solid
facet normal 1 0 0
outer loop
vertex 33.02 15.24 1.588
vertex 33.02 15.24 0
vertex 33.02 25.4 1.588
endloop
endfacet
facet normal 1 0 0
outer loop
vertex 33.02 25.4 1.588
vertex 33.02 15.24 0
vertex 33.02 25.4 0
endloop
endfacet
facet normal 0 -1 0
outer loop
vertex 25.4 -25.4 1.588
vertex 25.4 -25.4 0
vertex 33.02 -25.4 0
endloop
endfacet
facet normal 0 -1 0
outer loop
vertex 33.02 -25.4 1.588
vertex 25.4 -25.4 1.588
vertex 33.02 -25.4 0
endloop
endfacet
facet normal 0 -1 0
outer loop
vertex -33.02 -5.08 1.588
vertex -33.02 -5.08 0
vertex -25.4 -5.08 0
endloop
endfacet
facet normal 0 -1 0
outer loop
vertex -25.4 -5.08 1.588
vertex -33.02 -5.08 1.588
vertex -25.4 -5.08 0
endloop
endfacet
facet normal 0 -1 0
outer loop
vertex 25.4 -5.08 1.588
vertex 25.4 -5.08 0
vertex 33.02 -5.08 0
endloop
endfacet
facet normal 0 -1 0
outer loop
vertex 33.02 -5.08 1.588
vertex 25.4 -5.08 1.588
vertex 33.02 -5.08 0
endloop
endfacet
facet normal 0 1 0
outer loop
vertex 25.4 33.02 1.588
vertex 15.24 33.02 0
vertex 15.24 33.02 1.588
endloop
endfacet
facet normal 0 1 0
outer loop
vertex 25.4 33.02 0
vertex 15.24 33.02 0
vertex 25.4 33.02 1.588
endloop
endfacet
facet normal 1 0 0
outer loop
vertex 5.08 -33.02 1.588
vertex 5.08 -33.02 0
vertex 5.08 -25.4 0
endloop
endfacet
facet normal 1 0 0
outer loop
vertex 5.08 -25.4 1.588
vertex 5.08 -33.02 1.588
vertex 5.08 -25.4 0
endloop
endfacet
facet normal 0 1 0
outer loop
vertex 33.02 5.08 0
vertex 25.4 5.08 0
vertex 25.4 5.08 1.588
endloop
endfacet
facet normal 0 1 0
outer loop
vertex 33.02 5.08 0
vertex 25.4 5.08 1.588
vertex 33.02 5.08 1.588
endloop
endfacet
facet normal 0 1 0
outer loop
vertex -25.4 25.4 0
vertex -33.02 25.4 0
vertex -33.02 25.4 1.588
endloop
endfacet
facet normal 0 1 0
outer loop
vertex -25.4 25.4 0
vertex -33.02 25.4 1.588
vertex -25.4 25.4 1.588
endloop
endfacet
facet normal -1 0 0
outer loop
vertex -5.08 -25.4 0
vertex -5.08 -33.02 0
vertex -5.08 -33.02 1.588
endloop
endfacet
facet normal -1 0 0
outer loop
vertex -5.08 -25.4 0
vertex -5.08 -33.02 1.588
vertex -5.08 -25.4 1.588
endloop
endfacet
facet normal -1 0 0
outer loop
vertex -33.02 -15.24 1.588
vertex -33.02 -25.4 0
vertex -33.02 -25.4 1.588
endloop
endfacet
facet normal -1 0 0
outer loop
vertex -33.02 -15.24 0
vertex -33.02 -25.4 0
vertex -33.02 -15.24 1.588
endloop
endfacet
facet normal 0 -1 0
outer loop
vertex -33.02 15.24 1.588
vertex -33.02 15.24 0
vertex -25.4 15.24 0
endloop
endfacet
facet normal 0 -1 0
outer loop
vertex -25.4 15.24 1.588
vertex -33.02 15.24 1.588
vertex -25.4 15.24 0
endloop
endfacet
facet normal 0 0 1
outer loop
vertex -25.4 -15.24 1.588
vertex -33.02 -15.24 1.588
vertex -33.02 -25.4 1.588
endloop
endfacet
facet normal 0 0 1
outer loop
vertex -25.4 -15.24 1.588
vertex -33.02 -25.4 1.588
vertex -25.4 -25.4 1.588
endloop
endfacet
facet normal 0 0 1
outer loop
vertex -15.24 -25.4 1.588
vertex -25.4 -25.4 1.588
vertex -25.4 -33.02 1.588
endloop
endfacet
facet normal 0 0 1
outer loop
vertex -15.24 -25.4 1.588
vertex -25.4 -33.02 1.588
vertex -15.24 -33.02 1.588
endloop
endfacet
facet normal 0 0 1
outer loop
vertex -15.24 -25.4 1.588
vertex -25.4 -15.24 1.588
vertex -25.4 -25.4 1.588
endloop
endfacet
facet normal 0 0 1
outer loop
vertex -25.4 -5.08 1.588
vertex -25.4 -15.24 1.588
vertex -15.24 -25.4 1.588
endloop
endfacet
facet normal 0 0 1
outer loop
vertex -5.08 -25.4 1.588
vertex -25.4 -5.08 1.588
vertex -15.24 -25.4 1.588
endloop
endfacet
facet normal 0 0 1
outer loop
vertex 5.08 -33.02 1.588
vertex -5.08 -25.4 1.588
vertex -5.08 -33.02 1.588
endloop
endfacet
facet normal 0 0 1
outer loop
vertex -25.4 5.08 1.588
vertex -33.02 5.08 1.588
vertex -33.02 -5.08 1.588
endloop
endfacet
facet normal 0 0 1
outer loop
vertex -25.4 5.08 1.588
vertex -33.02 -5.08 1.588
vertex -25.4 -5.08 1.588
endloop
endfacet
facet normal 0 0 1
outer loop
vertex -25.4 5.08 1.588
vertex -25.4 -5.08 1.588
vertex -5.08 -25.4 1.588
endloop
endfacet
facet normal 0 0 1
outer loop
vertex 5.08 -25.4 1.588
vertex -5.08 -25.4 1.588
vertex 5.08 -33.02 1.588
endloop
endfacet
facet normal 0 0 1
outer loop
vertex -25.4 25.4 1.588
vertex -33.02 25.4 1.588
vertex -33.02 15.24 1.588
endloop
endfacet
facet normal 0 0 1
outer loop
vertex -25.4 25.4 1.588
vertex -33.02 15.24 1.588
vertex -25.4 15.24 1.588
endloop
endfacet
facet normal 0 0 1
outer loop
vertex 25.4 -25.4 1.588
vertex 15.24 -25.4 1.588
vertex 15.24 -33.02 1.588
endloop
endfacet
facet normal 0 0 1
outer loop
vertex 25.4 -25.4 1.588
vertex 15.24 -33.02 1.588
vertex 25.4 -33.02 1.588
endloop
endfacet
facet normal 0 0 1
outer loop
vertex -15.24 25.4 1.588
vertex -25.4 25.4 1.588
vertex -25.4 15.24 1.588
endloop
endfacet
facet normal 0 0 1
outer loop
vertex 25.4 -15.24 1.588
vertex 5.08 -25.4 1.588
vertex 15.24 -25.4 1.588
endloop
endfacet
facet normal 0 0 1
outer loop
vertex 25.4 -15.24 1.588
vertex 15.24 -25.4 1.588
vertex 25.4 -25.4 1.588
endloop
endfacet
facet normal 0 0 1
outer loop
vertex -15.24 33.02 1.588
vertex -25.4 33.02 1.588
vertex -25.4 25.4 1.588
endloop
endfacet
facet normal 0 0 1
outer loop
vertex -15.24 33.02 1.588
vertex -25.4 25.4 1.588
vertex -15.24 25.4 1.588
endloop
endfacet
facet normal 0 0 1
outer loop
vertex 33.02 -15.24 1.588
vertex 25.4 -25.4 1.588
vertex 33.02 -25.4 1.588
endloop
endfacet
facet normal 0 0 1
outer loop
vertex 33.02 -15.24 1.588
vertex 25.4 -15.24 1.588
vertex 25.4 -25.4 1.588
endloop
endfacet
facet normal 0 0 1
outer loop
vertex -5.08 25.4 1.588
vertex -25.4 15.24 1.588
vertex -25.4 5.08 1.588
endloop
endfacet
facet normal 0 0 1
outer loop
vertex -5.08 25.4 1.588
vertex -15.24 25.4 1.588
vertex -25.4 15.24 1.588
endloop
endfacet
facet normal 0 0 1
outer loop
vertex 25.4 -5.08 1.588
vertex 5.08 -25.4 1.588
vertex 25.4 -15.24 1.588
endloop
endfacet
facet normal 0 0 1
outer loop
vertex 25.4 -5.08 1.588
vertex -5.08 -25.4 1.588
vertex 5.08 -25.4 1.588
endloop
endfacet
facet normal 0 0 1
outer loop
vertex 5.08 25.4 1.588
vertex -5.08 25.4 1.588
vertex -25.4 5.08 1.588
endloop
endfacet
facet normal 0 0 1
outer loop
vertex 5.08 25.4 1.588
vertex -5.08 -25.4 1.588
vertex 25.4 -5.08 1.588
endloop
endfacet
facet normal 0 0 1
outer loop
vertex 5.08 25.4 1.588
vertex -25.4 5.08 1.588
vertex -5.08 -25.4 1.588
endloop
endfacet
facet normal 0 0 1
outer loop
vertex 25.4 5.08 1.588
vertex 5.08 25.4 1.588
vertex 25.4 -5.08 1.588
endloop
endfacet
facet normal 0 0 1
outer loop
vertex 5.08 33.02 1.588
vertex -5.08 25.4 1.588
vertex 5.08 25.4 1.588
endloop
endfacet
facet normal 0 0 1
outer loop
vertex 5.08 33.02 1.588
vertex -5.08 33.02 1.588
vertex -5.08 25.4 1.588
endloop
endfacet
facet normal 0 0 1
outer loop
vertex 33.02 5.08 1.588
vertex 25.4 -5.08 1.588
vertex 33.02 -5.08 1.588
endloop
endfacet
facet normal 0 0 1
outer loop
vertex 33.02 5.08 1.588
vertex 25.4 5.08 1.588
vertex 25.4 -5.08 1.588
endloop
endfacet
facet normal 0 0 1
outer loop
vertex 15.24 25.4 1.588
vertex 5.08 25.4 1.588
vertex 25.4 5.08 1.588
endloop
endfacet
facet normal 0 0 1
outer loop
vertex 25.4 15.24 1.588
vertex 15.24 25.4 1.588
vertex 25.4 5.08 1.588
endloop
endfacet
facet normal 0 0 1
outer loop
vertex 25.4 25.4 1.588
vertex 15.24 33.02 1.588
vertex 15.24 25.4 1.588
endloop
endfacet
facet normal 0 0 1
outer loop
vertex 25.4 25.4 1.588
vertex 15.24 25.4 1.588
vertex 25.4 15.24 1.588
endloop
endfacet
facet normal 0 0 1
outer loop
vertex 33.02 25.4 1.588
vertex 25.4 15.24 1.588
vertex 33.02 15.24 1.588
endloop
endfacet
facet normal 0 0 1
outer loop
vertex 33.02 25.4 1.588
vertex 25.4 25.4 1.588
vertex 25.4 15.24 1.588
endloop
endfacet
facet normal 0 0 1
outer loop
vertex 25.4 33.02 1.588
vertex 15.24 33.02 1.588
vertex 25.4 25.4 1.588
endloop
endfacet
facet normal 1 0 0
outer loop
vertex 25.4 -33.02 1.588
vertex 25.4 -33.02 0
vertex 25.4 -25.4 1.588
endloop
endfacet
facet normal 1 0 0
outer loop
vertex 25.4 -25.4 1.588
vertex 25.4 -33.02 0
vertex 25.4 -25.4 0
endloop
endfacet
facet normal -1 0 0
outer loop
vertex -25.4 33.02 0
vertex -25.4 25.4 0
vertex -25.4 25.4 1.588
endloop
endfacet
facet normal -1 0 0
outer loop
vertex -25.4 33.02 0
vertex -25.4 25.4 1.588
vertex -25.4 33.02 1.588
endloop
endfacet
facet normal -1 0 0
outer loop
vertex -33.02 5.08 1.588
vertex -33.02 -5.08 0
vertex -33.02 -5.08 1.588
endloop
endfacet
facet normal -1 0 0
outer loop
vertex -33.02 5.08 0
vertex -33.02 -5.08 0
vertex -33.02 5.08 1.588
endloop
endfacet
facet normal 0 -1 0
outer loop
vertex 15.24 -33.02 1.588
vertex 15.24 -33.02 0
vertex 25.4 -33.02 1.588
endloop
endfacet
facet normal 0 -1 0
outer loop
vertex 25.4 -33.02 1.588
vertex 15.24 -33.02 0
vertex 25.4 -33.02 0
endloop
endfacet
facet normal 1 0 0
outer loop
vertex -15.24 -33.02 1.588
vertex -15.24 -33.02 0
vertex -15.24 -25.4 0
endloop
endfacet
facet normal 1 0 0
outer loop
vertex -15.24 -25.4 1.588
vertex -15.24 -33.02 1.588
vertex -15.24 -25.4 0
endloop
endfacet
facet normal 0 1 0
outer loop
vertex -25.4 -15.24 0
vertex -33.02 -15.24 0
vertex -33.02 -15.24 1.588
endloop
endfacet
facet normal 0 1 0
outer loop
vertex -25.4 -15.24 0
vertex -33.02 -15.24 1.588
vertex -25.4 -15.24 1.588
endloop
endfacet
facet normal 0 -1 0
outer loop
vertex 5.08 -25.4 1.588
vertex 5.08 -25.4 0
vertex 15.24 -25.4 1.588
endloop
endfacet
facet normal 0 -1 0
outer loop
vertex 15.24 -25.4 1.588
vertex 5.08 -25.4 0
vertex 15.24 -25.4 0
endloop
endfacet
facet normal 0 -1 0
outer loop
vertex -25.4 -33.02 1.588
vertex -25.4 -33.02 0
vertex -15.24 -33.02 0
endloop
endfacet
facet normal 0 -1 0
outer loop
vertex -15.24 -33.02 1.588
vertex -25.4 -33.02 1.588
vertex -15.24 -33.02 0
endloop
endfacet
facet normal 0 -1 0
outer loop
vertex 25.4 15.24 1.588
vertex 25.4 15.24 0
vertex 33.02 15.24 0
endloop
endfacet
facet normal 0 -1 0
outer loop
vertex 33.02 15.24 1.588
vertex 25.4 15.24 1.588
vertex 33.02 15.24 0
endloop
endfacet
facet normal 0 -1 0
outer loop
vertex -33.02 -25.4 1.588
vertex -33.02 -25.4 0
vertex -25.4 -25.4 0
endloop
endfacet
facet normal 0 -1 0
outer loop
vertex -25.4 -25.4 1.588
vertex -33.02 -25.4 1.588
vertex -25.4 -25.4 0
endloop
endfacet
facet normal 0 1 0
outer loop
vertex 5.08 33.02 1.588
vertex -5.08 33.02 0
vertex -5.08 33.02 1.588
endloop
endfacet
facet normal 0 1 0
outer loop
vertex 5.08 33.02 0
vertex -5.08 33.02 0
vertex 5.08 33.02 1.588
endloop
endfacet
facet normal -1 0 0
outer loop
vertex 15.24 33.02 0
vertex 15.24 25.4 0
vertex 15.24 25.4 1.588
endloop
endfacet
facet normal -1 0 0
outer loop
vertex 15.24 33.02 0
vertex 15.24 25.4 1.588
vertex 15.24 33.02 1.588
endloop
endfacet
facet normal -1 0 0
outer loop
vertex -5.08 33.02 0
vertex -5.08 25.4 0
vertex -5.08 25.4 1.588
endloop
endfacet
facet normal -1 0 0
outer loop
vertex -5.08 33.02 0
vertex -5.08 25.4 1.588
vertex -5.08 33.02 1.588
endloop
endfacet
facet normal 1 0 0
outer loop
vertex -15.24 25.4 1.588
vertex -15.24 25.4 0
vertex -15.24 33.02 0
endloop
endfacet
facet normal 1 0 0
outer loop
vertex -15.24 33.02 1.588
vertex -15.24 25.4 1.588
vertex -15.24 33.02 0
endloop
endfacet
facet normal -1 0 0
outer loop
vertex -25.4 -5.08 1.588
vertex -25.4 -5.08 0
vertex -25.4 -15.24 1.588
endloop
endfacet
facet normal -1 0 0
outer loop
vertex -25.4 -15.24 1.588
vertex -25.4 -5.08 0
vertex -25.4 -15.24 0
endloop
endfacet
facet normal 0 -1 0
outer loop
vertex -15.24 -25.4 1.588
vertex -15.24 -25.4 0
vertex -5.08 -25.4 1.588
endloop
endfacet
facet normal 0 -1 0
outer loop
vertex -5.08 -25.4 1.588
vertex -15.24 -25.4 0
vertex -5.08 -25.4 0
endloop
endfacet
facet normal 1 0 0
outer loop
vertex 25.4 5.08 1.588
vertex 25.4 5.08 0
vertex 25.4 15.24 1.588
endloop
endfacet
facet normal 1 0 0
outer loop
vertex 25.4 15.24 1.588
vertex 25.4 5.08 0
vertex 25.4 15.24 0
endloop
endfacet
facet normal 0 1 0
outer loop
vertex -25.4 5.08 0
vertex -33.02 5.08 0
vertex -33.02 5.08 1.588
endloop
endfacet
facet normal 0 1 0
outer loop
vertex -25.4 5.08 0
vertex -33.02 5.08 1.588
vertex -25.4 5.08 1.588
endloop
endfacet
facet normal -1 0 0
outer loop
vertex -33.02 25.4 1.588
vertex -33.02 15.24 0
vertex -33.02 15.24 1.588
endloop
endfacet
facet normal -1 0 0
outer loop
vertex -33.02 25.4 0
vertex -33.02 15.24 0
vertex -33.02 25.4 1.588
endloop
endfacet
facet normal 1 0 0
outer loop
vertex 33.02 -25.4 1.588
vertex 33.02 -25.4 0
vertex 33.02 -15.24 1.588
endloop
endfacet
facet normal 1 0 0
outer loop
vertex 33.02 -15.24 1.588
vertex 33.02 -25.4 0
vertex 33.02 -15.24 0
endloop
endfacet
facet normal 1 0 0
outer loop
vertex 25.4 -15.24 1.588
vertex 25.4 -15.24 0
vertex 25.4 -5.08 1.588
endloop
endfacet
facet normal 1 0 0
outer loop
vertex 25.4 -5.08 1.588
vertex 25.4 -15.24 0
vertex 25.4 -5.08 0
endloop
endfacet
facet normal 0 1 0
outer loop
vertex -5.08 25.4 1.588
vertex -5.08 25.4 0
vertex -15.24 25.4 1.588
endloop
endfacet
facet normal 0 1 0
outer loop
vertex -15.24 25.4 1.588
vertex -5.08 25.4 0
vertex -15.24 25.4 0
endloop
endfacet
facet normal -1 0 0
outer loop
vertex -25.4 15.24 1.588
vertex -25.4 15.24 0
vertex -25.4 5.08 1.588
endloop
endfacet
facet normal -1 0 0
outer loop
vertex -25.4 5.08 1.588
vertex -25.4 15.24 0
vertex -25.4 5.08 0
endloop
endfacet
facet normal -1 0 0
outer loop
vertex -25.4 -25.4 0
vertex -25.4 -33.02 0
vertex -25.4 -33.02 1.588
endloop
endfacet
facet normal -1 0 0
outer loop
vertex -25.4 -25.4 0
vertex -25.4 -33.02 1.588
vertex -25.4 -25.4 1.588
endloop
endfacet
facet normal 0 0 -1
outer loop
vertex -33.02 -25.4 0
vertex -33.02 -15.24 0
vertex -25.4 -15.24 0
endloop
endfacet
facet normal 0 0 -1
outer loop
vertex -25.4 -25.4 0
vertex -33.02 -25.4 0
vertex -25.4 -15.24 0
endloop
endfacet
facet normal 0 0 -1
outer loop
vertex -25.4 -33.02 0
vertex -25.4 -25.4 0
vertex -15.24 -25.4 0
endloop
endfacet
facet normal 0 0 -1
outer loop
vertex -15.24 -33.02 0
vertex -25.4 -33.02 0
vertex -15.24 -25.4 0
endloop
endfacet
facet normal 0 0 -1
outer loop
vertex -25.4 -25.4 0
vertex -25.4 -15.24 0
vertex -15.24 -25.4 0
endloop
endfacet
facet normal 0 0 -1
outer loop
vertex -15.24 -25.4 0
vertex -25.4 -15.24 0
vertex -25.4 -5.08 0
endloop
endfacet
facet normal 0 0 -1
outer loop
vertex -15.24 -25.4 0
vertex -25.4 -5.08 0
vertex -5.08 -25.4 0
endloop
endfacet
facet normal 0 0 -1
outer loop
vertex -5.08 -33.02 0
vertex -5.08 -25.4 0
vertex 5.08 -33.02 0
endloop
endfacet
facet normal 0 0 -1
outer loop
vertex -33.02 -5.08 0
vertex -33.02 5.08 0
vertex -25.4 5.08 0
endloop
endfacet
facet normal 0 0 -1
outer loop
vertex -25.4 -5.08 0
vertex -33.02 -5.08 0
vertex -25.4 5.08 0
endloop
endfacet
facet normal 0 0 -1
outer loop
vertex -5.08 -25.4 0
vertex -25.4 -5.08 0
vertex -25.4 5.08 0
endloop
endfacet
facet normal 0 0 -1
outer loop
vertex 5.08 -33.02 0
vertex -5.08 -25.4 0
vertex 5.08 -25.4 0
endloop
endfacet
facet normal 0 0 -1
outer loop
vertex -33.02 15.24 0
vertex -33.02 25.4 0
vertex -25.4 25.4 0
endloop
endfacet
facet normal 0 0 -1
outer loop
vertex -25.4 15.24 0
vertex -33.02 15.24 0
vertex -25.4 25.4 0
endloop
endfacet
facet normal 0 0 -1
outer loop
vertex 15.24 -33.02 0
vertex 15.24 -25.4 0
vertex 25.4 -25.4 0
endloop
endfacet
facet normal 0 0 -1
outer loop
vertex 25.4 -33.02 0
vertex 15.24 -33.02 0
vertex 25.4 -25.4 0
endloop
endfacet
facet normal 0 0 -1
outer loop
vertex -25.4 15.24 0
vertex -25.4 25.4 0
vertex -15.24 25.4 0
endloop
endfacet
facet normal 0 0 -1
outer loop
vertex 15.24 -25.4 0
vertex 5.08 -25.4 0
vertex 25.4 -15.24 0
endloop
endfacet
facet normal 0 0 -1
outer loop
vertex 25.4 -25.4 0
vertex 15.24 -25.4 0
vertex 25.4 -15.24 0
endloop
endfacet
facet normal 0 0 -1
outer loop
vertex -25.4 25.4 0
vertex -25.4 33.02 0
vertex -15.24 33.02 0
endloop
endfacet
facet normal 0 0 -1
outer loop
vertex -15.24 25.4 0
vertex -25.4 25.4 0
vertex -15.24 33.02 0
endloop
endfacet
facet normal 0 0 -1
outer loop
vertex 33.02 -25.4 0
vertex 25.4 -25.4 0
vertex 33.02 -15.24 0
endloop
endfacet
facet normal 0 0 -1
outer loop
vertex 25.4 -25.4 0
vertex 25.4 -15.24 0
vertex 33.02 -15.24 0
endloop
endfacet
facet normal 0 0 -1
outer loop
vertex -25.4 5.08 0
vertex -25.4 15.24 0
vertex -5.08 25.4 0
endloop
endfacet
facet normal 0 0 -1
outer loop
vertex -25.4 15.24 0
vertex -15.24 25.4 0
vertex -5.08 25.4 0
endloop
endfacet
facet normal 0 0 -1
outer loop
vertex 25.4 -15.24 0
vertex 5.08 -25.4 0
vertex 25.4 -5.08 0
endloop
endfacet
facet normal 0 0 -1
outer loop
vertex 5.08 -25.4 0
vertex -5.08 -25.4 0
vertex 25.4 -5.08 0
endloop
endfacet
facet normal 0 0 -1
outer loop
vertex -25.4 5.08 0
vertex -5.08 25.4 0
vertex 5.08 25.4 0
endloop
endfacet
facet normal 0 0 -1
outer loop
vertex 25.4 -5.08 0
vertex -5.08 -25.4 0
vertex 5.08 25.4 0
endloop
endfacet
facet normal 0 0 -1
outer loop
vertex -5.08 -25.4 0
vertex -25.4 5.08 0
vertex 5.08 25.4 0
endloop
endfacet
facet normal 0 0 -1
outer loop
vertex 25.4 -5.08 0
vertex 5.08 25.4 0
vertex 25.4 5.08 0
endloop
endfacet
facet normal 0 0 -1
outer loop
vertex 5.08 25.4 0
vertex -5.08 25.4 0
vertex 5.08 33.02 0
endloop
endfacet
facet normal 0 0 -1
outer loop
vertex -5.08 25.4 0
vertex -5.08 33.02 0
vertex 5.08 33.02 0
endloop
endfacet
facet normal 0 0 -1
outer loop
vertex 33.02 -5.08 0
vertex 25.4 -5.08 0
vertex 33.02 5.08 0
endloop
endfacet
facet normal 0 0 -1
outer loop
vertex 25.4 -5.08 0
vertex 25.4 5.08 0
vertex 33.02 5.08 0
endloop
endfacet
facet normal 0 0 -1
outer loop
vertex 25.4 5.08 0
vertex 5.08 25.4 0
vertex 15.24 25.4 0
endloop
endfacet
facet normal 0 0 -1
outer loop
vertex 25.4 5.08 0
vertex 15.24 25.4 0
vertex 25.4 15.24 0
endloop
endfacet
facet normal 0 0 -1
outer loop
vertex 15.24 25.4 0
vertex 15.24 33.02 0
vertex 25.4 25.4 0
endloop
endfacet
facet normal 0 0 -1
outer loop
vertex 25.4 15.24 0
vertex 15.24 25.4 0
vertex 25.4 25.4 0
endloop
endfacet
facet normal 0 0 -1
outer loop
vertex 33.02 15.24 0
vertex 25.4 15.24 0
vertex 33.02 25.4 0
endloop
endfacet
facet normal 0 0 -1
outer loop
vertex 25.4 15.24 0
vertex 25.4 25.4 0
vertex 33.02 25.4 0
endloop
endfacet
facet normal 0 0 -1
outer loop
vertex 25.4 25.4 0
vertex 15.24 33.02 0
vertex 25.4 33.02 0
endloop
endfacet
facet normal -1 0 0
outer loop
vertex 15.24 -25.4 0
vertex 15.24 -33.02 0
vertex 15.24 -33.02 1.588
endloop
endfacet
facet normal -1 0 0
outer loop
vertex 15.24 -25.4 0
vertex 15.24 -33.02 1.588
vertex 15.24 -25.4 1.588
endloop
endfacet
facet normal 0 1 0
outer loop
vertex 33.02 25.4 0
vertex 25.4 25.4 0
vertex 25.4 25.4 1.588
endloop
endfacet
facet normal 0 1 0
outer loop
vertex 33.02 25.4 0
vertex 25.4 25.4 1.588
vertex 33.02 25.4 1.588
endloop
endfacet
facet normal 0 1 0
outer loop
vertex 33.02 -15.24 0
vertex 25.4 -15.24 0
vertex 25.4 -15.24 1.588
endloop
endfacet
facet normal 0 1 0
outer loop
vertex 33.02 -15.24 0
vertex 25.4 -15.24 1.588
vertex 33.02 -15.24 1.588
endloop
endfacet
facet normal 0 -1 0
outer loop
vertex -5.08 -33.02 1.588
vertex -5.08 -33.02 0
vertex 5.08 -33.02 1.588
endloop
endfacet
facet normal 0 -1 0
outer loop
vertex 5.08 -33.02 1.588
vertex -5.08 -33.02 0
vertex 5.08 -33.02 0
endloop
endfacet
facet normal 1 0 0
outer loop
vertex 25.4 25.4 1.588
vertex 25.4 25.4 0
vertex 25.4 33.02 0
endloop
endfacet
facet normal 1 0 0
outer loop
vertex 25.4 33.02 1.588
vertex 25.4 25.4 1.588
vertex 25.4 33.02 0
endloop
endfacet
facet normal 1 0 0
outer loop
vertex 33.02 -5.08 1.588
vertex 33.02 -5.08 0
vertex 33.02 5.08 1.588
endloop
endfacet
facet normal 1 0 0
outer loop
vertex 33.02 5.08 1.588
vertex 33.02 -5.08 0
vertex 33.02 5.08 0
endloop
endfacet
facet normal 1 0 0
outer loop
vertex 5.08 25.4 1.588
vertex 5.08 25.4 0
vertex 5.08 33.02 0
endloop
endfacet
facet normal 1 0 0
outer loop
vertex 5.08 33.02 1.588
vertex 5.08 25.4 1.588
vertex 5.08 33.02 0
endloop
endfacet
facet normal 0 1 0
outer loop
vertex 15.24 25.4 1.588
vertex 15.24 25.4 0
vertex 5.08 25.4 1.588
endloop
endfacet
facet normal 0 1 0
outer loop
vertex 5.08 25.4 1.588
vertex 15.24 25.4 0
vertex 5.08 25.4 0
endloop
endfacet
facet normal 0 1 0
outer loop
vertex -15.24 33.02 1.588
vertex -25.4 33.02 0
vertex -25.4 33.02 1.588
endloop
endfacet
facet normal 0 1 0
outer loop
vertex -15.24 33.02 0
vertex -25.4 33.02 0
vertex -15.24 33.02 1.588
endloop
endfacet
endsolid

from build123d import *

# Parameters (mm, degrees)
F0_W     = 7.62
F0_H     = 10.16
F0_W_2   = 10.16
F0_H_2   = 7.62
F0_W_3   = 10.160000307
F0_W_4   = 7.619999693
F1_DEPTH = 1.5875


# Not quite as in the source:
# - ends of sketch curves that miss each other by under 0.0002 mm in the source are joined


with BuildPart() as f1:
    # F0 (on Top) → F1 (new body)
    with BuildSketch(Plane.XY):
        with Locations((29.21, -20.32)):
            Rectangle(F0_W, F0_H)
        with Locations((20.320000307, -29.21)):
            Rectangle(F0_W_2, F0_H_2)
        with Locations((3.07e-07, -29.21)):
            Rectangle(F0_W_2, F0_H_2)
        with Locations((-20.3199998465, -29.21)):
            Rectangle(F0_W_3, F0_H_2)
        with Locations((-29.2099998465, -20.32)):
            Rectangle(F0_W_4, F0_H)
        with Locations((-29.2099998465, 0)):
            Rectangle(F0_W_4, F0_H)
        with Locations((-29.2099998465, 20.32)):
            Rectangle(F0_W_4, F0_H)
        with Locations((-20.320000307, 29.21)):
            Rectangle(F0_W_2, F0_H_2)
        with Locations((-3.07e-07, 29.21)):
            Rectangle(F0_W_2, F0_H_2)
        with Locations((20.3199998465, 29.21)):
            Rectangle(F0_W_3, F0_H_2)
        with Locations((29.21, 20.32)):
            Rectangle(F0_W, F0_H)
        Polygon((25.4, 15.24), (25.4, 25.4), (15.239999693, 25.4), (5.079999693, 25.4), (-5.080000307, 25.4), (-15.240000307, 25.4), (-25.4, 25.4), (-25.4, 15.24), (-25.4, 5.08), (-25.4, -5.08), (-25.4, -15.24), (-25.4, -25.4), (-15.239999693, -25.4), (-5.079999693, -25.4), (5.080000307, -25.4), (15.240000307, -25.4), (25.4, -25.4), (25.4, -15.24), (25.4, -5.08), (25.4, 5.08), align=None)
        with Locations((29.21, 0)):
            Rectangle(F0_W, F0_H)
    extrude(amount=F1_DEPTH)


solid = f1.part
